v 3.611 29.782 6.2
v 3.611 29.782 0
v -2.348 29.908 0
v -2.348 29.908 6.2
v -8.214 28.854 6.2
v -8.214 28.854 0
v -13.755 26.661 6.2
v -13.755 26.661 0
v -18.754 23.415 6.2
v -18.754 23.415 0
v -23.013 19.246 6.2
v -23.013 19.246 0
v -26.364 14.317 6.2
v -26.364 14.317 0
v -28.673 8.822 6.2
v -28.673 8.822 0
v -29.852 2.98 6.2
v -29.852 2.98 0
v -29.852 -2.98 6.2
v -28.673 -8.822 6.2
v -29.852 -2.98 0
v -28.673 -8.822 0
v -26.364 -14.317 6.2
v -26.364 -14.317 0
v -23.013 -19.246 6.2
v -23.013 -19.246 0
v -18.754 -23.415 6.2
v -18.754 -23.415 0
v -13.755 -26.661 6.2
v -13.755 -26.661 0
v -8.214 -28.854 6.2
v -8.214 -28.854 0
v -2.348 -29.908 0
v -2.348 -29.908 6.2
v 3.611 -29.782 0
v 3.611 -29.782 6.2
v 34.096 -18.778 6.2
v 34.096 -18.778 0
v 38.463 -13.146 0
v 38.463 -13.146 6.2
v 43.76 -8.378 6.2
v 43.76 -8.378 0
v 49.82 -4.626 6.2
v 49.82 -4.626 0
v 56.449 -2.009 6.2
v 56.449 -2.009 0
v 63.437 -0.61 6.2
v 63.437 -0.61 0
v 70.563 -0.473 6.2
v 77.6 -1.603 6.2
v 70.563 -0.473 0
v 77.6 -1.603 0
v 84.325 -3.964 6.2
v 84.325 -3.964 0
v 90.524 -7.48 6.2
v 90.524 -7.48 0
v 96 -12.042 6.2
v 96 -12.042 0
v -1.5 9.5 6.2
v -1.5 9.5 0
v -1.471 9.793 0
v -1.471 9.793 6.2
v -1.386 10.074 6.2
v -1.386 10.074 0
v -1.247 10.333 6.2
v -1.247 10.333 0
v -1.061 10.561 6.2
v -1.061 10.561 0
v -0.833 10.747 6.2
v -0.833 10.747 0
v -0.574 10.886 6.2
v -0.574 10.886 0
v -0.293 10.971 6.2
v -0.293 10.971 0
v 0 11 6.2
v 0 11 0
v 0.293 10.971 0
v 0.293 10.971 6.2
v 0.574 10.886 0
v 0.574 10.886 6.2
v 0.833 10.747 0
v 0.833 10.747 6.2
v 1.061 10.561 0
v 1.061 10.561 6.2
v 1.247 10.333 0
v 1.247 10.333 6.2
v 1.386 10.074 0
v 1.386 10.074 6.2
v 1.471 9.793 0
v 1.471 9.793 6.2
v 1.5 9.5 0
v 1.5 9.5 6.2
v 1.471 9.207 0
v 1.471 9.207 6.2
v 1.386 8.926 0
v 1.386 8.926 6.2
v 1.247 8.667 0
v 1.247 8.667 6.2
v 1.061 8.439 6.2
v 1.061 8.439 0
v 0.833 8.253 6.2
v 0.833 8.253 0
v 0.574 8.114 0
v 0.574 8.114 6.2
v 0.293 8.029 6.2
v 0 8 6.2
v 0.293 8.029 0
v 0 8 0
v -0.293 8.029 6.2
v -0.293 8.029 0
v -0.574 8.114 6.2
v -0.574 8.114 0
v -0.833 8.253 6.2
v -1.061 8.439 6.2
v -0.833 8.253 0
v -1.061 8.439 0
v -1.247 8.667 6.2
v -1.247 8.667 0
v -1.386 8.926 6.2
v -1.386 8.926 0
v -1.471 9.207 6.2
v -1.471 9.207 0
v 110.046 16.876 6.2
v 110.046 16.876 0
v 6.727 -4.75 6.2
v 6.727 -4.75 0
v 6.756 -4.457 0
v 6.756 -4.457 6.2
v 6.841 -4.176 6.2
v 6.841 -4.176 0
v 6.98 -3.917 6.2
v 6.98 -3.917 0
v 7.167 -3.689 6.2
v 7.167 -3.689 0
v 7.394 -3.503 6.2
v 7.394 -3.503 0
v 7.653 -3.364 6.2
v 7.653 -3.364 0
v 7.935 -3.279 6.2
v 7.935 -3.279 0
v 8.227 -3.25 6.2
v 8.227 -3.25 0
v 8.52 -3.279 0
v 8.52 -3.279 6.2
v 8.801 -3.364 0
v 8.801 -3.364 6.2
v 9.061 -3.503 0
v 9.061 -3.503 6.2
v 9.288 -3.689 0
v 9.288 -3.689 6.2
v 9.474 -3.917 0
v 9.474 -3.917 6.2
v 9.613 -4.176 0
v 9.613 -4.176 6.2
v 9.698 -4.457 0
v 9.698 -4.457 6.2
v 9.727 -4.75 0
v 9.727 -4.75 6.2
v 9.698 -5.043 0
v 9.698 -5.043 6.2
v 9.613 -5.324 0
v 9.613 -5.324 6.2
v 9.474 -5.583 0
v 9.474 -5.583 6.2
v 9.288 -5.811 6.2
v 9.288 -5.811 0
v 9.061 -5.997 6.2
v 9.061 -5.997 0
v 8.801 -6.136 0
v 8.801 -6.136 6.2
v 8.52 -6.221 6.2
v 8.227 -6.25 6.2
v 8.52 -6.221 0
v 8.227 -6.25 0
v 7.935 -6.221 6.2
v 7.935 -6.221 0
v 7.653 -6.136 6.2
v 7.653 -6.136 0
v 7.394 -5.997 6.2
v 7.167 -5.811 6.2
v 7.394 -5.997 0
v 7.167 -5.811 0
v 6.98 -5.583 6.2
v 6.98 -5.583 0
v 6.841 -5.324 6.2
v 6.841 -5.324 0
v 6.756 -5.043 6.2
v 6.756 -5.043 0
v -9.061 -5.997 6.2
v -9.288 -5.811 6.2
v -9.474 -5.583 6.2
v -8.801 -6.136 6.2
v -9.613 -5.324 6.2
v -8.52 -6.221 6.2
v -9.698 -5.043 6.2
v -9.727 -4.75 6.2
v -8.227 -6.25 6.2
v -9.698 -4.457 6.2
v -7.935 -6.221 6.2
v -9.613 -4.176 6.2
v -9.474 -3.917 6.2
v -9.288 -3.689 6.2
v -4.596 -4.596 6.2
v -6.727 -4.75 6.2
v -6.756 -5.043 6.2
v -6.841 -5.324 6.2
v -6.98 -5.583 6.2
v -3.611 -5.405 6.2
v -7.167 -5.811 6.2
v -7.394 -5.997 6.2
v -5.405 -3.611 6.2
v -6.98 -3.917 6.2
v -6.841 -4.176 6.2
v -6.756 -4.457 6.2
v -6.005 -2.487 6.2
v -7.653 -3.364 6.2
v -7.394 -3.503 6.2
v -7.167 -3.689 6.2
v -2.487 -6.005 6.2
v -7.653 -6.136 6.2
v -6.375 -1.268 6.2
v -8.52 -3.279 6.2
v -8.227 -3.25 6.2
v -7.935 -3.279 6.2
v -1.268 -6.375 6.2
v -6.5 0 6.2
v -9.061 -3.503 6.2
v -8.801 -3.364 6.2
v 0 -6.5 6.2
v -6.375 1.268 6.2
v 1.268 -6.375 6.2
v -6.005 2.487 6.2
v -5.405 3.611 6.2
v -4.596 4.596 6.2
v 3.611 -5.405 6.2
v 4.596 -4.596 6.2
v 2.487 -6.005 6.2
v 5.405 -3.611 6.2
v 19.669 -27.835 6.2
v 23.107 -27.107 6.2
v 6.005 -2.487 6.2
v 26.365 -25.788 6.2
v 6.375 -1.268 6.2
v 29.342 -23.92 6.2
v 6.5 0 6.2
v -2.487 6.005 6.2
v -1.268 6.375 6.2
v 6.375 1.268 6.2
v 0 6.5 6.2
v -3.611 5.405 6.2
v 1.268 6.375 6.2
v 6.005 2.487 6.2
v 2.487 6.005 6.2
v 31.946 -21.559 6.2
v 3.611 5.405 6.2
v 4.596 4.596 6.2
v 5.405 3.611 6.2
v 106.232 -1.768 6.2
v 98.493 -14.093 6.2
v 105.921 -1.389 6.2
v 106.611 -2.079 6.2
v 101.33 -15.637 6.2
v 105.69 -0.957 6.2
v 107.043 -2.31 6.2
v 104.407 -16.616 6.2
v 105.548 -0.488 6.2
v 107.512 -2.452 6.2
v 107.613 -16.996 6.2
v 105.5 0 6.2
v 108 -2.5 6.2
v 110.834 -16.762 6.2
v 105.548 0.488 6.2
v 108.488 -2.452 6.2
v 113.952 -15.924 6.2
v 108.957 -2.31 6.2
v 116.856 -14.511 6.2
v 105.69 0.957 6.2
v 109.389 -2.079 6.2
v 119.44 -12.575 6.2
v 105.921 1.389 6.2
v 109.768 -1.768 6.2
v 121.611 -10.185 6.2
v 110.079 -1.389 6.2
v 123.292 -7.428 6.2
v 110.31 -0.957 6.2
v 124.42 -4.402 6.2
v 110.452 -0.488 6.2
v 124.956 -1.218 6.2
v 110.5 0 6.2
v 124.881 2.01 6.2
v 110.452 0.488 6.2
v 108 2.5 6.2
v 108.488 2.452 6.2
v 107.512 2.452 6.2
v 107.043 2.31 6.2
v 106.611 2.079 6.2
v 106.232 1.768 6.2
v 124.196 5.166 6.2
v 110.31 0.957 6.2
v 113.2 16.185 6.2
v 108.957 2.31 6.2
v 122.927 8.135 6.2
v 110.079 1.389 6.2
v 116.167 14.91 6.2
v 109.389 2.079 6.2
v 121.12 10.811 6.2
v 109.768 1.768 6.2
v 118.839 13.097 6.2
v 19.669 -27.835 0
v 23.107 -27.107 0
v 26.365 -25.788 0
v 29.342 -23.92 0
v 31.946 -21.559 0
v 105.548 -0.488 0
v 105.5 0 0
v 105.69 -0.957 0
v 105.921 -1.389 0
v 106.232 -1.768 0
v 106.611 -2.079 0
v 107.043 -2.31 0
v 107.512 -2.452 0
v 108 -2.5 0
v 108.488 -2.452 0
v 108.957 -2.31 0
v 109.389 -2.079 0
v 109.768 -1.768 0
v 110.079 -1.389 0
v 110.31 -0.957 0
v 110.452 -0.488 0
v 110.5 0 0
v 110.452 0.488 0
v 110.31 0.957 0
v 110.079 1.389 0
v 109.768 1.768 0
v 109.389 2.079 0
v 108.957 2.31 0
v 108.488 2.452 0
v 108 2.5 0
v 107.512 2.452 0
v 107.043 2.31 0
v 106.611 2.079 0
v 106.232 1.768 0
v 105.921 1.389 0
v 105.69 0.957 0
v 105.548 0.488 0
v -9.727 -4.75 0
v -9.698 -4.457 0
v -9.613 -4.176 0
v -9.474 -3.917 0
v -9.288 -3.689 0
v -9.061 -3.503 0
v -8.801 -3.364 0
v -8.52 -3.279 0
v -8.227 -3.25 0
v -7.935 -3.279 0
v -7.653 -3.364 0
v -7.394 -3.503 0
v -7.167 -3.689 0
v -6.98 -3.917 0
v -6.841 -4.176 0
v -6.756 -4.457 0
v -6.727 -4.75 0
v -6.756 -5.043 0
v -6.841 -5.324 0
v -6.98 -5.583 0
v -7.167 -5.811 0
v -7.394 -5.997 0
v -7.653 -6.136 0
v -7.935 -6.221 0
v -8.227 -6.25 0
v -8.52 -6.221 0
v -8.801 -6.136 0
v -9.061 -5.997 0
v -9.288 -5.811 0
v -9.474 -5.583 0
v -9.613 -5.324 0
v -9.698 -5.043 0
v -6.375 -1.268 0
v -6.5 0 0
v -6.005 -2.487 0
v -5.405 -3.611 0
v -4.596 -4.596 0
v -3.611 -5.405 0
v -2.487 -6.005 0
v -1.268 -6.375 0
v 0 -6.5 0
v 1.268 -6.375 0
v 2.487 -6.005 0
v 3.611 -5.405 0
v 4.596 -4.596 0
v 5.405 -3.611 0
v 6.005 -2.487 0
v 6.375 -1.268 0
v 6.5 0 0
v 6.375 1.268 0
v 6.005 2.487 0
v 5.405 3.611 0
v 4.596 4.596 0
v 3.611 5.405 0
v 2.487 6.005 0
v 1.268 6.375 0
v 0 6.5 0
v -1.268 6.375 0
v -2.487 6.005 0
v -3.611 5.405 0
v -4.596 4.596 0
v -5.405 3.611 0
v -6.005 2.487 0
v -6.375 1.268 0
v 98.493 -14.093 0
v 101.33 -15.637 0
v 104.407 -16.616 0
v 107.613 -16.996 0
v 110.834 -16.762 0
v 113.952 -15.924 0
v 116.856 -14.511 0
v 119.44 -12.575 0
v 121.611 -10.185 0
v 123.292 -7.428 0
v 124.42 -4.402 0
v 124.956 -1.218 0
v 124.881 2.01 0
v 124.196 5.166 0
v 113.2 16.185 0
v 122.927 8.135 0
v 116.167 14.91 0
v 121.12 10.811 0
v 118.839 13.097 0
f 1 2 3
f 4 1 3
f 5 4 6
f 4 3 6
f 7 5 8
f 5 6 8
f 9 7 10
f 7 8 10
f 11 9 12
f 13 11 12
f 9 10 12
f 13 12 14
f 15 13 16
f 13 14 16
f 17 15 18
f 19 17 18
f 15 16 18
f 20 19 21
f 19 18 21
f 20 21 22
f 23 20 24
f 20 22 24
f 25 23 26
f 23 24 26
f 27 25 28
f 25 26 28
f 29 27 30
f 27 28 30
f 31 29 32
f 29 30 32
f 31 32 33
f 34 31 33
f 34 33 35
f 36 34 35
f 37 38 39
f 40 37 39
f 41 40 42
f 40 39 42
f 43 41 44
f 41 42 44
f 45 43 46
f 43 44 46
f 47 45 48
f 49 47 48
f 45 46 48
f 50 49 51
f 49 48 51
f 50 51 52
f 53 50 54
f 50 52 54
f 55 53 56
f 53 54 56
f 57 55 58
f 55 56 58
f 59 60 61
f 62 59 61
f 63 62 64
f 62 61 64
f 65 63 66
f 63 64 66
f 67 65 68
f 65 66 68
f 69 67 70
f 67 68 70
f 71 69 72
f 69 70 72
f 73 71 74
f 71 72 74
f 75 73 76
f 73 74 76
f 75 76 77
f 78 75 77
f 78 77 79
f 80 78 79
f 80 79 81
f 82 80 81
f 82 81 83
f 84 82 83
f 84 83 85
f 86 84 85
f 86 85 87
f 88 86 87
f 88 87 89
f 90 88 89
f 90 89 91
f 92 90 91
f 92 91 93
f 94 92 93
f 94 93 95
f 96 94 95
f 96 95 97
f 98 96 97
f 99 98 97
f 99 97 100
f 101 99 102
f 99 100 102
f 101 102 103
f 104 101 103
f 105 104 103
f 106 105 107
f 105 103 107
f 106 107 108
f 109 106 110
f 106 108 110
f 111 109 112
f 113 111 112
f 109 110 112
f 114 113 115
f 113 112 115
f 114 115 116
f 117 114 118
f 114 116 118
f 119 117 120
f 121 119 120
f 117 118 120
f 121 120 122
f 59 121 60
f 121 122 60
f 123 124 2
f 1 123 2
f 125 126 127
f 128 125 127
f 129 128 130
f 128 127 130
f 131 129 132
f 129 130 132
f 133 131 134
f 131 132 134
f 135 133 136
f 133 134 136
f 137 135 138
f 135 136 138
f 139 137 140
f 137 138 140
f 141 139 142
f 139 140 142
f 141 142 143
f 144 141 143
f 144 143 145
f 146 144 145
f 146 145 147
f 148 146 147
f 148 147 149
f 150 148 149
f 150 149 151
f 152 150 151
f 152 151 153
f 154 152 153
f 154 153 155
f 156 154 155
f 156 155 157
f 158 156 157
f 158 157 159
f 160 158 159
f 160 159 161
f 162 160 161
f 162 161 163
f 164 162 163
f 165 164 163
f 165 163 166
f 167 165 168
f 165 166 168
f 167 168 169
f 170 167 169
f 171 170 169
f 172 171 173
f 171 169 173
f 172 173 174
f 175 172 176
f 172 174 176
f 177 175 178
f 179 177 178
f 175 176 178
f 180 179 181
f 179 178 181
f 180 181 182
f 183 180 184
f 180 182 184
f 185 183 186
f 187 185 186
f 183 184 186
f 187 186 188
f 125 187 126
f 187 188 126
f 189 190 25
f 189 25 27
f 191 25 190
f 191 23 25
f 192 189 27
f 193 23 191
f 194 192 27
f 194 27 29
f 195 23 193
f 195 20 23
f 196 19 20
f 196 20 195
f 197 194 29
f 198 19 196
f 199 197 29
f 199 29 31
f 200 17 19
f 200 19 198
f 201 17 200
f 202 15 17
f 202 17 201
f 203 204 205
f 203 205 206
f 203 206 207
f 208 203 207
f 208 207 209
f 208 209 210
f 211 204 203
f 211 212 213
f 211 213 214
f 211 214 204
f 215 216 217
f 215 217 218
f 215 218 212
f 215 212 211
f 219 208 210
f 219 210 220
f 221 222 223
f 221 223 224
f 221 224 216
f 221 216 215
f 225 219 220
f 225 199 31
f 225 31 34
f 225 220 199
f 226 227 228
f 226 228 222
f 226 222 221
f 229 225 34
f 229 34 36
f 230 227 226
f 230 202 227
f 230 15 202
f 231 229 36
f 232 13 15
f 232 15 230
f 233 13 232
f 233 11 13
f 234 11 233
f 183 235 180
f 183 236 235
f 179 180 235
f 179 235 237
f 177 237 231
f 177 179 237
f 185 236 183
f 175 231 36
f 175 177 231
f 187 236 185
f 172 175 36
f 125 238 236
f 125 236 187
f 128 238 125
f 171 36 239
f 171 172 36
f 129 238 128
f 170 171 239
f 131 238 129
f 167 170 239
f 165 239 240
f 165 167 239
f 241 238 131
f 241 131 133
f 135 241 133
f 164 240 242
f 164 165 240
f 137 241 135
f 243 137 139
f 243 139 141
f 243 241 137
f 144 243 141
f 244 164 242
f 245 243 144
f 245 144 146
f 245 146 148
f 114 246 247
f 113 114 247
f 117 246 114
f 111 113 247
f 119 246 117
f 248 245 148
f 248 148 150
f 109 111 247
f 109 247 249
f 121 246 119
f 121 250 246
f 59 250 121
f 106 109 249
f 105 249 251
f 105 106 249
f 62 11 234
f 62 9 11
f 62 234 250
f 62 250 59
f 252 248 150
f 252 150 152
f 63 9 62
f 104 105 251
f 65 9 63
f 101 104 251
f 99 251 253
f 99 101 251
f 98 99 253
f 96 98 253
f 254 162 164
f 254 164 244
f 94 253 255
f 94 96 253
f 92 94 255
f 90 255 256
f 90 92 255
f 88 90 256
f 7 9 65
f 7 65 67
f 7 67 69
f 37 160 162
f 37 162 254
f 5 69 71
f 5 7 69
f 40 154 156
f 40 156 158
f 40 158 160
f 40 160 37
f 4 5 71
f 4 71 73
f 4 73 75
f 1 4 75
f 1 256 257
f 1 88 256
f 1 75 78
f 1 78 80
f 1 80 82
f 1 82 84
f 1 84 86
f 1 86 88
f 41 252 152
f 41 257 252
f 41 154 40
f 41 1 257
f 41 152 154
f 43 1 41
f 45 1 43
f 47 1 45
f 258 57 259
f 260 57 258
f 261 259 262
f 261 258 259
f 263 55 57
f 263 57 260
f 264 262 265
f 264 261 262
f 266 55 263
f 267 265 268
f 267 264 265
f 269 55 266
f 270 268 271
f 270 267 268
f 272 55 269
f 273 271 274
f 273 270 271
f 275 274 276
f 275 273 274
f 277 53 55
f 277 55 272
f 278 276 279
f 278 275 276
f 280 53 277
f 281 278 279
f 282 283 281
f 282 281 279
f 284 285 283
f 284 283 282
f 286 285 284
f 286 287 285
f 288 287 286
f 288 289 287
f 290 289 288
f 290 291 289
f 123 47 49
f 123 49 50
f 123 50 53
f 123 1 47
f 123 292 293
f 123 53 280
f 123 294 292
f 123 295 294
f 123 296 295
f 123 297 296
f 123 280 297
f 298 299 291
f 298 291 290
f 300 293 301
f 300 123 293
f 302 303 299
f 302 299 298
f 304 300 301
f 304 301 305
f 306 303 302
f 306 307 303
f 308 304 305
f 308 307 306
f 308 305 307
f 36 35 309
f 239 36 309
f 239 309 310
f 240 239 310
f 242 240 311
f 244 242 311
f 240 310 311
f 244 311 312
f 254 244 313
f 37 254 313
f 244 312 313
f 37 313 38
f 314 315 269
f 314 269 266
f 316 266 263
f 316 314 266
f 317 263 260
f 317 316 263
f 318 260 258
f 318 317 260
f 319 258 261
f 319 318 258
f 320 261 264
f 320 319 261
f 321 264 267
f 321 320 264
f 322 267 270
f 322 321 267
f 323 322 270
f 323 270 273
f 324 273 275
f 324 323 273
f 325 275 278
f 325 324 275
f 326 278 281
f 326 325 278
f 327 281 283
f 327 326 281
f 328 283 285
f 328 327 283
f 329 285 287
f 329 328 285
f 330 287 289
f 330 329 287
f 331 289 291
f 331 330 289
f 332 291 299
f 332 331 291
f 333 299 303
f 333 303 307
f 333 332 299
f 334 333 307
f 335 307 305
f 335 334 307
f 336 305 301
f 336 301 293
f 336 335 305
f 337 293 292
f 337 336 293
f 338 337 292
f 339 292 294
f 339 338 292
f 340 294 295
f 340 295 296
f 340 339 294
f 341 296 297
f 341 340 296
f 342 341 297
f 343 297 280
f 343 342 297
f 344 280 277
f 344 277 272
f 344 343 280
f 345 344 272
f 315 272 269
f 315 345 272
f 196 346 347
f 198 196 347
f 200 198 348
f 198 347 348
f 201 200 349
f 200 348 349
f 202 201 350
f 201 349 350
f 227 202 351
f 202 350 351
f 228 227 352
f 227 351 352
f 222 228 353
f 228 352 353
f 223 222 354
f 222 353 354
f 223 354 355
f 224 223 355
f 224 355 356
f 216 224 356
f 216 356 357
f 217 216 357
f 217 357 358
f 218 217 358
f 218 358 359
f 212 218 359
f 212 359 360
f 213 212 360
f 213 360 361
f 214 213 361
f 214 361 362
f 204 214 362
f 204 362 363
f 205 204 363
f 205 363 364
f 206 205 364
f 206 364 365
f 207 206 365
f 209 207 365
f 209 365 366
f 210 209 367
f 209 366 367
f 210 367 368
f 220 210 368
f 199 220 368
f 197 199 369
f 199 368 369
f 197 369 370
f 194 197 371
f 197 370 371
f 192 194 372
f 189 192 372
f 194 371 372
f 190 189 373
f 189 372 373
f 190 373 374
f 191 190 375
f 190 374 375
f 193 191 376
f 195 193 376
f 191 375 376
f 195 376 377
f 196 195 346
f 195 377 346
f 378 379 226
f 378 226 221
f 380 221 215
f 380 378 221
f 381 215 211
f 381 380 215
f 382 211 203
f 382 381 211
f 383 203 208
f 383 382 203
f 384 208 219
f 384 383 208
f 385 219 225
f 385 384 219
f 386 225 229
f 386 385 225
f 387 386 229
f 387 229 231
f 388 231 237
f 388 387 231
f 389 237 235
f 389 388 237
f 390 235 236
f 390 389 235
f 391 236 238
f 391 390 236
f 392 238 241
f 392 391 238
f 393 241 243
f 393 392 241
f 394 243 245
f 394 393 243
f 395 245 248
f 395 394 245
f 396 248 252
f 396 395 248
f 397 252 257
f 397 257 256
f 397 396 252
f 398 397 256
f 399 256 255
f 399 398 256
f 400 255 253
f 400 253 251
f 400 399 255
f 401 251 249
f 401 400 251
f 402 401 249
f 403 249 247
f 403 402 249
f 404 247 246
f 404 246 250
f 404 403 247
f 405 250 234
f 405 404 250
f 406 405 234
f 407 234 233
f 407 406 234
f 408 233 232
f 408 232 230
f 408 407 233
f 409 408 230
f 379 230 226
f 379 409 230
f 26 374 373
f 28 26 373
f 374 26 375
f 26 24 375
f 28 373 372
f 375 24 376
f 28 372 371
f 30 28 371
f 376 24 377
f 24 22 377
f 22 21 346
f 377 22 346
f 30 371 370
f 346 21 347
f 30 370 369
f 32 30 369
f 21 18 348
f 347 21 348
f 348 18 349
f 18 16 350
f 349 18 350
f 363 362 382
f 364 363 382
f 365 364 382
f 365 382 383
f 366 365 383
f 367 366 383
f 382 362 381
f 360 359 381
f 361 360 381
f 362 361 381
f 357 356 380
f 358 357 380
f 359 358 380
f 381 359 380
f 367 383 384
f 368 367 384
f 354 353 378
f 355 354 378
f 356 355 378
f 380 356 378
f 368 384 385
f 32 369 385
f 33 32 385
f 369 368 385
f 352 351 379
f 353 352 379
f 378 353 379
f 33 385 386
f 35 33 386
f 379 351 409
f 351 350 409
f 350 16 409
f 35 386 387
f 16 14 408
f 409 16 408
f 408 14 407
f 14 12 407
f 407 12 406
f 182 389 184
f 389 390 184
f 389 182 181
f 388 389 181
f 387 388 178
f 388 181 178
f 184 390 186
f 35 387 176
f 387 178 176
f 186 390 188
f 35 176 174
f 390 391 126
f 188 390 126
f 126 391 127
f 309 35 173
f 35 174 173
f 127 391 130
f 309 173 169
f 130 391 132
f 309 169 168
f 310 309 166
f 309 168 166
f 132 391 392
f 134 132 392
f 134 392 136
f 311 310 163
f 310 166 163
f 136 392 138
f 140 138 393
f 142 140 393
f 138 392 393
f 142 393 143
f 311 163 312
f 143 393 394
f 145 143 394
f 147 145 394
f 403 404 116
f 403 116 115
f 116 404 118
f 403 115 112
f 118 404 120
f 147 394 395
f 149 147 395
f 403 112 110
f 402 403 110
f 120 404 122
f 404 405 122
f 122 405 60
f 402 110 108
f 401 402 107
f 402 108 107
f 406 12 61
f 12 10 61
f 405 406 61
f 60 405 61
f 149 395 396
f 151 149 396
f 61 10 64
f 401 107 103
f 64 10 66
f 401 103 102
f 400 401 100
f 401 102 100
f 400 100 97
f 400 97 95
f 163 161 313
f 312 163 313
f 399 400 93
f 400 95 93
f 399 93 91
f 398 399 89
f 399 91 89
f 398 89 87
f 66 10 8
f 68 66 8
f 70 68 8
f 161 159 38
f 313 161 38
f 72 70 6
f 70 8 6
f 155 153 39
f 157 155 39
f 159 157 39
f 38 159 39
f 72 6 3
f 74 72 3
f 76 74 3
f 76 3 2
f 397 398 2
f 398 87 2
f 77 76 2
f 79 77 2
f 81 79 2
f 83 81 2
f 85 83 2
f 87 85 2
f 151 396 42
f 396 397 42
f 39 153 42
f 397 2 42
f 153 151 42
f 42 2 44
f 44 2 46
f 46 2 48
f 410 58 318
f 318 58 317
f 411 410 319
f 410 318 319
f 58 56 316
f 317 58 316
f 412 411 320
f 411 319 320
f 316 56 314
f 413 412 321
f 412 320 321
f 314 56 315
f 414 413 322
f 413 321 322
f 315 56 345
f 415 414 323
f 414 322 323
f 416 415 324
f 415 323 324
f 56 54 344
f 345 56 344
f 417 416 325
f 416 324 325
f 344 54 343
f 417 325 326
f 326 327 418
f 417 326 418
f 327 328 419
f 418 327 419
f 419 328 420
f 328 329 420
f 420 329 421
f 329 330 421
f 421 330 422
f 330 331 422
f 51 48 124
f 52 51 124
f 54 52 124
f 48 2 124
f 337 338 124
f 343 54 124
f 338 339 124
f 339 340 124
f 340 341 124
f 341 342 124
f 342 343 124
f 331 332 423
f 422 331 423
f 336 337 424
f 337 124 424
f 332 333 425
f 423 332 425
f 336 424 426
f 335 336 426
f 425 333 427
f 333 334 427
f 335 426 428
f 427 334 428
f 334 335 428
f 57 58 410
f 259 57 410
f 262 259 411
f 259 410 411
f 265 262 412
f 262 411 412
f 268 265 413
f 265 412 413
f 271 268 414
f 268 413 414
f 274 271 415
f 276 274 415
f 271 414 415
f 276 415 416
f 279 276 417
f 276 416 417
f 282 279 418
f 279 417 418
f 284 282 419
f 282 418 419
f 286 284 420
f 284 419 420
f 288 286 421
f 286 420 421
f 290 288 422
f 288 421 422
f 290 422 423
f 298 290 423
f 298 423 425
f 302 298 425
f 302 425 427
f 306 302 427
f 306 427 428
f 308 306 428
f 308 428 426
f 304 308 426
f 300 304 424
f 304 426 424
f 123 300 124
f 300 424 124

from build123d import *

# Parameters (mm, degrees)
SKETCH1_R           = 2.5
SKETCH1_R_2         = 6.5
BOSS_EXTRUDE1_DEPTH = 6.2
CUT_EXTRUDE1_REACH  = 130.699
SKETCH2_R           = 1.5


with BuildPart() as part:
    # Sketch1 → Boss-Extrude1 (new body)
    with BuildSketch(Plane.XY):
        with BuildLine():
            Line((3.611111111, -29.781871609), (19.668670355, -27.834860643))
            ThreePointArc((19.668670355, -27.834860643), (27.894571922, -24.919368692), (34.095743926, -18.778439145))
            ThreePointArc((34.095743926, -18.778439145), (63.437182893, -0.609540518), (96, -12.041594579))
            ThreePointArc((96, -12.041594579), (123.291552208, -7.427545426), (110.046296296, 16.876393912))
            Line((110.046296296, 16.876393912), (3.611111111, 29.781871609))
            ThreePointArc((3.611111111, 29.781871609), (-30, 0), (3.611111111, -29.781871609))
        make_face()
        with Locations(Location((108, 0, 0), (0, 0, 180))):
            Circle(SKETCH1_R, mode=Mode.SUBTRACT)
        with Locations(Location((0, 0, 0), (0, 0, 180))):
            Circle(SKETCH1_R_2, mode=Mode.SUBTRACT)
    extrude(amount=BOSS_EXTRUDE1_DEPTH)

    # Sketch2 → Cut-Extrude1 (cut, up to next)
    with BuildSketch(Plane(origin=(0, 0, 0), x_dir=(-1, 0, 0), z_dir=(0, 0, -1)), mode=Mode.PRIVATE) as cut_extrude1_sk1:
        with Locations((8.227241336, -4.75)):
            Circle(SKETCH2_R)
    cut_extrude1_tool1 = extrude(cut_extrude1_sk1.sketch, amount=-CUT_EXTRUDE1_REACH, mode=Mode.PRIVATE) & part.part
    # Sketch2 → Cut-Extrude1 (cut, up to next)
    with BuildSketch(Plane(origin=(0, 0, 0), x_dir=(-1, 0, 0), z_dir=(0, 0, -1)), mode=Mode.PRIVATE) as cut_extrude1_sk2:
        with Locations((-8.227241336, -4.75)):
            Circle(SKETCH2_R)
    cut_extrude1_tool2 = extrude(cut_extrude1_sk2.sketch, amount=-CUT_EXTRUDE1_REACH, mode=Mode.PRIVATE) & part.part
    # Sketch2 → Cut-Extrude1 (cut, up to next)
    with BuildSketch(Plane(origin=(0, 0, 0), x_dir=(-1, 0, 0), z_dir=(0, 0, -1)), mode=Mode.PRIVATE) as cut_extrude1_sk3:
        with Locations((0, 9.5)):
            Circle(SKETCH2_R)
    cut_extrude1_tool3 = extrude(cut_extrude1_sk3.sketch, amount=-CUT_EXTRUDE1_REACH, mode=Mode.PRIVATE) & part.part
    add(cut_extrude1_tool1.solids().sort_by_distance((-8.227241, -4.75, 0))[0], mode=Mode.SUBTRACT)
    add(cut_extrude1_tool2.solids().sort_by_distance((8.227241, -4.75, 0))[0], mode=Mode.SUBTRACT)
    add(cut_extrude1_tool3.solids().sort_by_distance((0, 9.5, 0))[0], mode=Mode.SUBTRACT)


solid = part.part
